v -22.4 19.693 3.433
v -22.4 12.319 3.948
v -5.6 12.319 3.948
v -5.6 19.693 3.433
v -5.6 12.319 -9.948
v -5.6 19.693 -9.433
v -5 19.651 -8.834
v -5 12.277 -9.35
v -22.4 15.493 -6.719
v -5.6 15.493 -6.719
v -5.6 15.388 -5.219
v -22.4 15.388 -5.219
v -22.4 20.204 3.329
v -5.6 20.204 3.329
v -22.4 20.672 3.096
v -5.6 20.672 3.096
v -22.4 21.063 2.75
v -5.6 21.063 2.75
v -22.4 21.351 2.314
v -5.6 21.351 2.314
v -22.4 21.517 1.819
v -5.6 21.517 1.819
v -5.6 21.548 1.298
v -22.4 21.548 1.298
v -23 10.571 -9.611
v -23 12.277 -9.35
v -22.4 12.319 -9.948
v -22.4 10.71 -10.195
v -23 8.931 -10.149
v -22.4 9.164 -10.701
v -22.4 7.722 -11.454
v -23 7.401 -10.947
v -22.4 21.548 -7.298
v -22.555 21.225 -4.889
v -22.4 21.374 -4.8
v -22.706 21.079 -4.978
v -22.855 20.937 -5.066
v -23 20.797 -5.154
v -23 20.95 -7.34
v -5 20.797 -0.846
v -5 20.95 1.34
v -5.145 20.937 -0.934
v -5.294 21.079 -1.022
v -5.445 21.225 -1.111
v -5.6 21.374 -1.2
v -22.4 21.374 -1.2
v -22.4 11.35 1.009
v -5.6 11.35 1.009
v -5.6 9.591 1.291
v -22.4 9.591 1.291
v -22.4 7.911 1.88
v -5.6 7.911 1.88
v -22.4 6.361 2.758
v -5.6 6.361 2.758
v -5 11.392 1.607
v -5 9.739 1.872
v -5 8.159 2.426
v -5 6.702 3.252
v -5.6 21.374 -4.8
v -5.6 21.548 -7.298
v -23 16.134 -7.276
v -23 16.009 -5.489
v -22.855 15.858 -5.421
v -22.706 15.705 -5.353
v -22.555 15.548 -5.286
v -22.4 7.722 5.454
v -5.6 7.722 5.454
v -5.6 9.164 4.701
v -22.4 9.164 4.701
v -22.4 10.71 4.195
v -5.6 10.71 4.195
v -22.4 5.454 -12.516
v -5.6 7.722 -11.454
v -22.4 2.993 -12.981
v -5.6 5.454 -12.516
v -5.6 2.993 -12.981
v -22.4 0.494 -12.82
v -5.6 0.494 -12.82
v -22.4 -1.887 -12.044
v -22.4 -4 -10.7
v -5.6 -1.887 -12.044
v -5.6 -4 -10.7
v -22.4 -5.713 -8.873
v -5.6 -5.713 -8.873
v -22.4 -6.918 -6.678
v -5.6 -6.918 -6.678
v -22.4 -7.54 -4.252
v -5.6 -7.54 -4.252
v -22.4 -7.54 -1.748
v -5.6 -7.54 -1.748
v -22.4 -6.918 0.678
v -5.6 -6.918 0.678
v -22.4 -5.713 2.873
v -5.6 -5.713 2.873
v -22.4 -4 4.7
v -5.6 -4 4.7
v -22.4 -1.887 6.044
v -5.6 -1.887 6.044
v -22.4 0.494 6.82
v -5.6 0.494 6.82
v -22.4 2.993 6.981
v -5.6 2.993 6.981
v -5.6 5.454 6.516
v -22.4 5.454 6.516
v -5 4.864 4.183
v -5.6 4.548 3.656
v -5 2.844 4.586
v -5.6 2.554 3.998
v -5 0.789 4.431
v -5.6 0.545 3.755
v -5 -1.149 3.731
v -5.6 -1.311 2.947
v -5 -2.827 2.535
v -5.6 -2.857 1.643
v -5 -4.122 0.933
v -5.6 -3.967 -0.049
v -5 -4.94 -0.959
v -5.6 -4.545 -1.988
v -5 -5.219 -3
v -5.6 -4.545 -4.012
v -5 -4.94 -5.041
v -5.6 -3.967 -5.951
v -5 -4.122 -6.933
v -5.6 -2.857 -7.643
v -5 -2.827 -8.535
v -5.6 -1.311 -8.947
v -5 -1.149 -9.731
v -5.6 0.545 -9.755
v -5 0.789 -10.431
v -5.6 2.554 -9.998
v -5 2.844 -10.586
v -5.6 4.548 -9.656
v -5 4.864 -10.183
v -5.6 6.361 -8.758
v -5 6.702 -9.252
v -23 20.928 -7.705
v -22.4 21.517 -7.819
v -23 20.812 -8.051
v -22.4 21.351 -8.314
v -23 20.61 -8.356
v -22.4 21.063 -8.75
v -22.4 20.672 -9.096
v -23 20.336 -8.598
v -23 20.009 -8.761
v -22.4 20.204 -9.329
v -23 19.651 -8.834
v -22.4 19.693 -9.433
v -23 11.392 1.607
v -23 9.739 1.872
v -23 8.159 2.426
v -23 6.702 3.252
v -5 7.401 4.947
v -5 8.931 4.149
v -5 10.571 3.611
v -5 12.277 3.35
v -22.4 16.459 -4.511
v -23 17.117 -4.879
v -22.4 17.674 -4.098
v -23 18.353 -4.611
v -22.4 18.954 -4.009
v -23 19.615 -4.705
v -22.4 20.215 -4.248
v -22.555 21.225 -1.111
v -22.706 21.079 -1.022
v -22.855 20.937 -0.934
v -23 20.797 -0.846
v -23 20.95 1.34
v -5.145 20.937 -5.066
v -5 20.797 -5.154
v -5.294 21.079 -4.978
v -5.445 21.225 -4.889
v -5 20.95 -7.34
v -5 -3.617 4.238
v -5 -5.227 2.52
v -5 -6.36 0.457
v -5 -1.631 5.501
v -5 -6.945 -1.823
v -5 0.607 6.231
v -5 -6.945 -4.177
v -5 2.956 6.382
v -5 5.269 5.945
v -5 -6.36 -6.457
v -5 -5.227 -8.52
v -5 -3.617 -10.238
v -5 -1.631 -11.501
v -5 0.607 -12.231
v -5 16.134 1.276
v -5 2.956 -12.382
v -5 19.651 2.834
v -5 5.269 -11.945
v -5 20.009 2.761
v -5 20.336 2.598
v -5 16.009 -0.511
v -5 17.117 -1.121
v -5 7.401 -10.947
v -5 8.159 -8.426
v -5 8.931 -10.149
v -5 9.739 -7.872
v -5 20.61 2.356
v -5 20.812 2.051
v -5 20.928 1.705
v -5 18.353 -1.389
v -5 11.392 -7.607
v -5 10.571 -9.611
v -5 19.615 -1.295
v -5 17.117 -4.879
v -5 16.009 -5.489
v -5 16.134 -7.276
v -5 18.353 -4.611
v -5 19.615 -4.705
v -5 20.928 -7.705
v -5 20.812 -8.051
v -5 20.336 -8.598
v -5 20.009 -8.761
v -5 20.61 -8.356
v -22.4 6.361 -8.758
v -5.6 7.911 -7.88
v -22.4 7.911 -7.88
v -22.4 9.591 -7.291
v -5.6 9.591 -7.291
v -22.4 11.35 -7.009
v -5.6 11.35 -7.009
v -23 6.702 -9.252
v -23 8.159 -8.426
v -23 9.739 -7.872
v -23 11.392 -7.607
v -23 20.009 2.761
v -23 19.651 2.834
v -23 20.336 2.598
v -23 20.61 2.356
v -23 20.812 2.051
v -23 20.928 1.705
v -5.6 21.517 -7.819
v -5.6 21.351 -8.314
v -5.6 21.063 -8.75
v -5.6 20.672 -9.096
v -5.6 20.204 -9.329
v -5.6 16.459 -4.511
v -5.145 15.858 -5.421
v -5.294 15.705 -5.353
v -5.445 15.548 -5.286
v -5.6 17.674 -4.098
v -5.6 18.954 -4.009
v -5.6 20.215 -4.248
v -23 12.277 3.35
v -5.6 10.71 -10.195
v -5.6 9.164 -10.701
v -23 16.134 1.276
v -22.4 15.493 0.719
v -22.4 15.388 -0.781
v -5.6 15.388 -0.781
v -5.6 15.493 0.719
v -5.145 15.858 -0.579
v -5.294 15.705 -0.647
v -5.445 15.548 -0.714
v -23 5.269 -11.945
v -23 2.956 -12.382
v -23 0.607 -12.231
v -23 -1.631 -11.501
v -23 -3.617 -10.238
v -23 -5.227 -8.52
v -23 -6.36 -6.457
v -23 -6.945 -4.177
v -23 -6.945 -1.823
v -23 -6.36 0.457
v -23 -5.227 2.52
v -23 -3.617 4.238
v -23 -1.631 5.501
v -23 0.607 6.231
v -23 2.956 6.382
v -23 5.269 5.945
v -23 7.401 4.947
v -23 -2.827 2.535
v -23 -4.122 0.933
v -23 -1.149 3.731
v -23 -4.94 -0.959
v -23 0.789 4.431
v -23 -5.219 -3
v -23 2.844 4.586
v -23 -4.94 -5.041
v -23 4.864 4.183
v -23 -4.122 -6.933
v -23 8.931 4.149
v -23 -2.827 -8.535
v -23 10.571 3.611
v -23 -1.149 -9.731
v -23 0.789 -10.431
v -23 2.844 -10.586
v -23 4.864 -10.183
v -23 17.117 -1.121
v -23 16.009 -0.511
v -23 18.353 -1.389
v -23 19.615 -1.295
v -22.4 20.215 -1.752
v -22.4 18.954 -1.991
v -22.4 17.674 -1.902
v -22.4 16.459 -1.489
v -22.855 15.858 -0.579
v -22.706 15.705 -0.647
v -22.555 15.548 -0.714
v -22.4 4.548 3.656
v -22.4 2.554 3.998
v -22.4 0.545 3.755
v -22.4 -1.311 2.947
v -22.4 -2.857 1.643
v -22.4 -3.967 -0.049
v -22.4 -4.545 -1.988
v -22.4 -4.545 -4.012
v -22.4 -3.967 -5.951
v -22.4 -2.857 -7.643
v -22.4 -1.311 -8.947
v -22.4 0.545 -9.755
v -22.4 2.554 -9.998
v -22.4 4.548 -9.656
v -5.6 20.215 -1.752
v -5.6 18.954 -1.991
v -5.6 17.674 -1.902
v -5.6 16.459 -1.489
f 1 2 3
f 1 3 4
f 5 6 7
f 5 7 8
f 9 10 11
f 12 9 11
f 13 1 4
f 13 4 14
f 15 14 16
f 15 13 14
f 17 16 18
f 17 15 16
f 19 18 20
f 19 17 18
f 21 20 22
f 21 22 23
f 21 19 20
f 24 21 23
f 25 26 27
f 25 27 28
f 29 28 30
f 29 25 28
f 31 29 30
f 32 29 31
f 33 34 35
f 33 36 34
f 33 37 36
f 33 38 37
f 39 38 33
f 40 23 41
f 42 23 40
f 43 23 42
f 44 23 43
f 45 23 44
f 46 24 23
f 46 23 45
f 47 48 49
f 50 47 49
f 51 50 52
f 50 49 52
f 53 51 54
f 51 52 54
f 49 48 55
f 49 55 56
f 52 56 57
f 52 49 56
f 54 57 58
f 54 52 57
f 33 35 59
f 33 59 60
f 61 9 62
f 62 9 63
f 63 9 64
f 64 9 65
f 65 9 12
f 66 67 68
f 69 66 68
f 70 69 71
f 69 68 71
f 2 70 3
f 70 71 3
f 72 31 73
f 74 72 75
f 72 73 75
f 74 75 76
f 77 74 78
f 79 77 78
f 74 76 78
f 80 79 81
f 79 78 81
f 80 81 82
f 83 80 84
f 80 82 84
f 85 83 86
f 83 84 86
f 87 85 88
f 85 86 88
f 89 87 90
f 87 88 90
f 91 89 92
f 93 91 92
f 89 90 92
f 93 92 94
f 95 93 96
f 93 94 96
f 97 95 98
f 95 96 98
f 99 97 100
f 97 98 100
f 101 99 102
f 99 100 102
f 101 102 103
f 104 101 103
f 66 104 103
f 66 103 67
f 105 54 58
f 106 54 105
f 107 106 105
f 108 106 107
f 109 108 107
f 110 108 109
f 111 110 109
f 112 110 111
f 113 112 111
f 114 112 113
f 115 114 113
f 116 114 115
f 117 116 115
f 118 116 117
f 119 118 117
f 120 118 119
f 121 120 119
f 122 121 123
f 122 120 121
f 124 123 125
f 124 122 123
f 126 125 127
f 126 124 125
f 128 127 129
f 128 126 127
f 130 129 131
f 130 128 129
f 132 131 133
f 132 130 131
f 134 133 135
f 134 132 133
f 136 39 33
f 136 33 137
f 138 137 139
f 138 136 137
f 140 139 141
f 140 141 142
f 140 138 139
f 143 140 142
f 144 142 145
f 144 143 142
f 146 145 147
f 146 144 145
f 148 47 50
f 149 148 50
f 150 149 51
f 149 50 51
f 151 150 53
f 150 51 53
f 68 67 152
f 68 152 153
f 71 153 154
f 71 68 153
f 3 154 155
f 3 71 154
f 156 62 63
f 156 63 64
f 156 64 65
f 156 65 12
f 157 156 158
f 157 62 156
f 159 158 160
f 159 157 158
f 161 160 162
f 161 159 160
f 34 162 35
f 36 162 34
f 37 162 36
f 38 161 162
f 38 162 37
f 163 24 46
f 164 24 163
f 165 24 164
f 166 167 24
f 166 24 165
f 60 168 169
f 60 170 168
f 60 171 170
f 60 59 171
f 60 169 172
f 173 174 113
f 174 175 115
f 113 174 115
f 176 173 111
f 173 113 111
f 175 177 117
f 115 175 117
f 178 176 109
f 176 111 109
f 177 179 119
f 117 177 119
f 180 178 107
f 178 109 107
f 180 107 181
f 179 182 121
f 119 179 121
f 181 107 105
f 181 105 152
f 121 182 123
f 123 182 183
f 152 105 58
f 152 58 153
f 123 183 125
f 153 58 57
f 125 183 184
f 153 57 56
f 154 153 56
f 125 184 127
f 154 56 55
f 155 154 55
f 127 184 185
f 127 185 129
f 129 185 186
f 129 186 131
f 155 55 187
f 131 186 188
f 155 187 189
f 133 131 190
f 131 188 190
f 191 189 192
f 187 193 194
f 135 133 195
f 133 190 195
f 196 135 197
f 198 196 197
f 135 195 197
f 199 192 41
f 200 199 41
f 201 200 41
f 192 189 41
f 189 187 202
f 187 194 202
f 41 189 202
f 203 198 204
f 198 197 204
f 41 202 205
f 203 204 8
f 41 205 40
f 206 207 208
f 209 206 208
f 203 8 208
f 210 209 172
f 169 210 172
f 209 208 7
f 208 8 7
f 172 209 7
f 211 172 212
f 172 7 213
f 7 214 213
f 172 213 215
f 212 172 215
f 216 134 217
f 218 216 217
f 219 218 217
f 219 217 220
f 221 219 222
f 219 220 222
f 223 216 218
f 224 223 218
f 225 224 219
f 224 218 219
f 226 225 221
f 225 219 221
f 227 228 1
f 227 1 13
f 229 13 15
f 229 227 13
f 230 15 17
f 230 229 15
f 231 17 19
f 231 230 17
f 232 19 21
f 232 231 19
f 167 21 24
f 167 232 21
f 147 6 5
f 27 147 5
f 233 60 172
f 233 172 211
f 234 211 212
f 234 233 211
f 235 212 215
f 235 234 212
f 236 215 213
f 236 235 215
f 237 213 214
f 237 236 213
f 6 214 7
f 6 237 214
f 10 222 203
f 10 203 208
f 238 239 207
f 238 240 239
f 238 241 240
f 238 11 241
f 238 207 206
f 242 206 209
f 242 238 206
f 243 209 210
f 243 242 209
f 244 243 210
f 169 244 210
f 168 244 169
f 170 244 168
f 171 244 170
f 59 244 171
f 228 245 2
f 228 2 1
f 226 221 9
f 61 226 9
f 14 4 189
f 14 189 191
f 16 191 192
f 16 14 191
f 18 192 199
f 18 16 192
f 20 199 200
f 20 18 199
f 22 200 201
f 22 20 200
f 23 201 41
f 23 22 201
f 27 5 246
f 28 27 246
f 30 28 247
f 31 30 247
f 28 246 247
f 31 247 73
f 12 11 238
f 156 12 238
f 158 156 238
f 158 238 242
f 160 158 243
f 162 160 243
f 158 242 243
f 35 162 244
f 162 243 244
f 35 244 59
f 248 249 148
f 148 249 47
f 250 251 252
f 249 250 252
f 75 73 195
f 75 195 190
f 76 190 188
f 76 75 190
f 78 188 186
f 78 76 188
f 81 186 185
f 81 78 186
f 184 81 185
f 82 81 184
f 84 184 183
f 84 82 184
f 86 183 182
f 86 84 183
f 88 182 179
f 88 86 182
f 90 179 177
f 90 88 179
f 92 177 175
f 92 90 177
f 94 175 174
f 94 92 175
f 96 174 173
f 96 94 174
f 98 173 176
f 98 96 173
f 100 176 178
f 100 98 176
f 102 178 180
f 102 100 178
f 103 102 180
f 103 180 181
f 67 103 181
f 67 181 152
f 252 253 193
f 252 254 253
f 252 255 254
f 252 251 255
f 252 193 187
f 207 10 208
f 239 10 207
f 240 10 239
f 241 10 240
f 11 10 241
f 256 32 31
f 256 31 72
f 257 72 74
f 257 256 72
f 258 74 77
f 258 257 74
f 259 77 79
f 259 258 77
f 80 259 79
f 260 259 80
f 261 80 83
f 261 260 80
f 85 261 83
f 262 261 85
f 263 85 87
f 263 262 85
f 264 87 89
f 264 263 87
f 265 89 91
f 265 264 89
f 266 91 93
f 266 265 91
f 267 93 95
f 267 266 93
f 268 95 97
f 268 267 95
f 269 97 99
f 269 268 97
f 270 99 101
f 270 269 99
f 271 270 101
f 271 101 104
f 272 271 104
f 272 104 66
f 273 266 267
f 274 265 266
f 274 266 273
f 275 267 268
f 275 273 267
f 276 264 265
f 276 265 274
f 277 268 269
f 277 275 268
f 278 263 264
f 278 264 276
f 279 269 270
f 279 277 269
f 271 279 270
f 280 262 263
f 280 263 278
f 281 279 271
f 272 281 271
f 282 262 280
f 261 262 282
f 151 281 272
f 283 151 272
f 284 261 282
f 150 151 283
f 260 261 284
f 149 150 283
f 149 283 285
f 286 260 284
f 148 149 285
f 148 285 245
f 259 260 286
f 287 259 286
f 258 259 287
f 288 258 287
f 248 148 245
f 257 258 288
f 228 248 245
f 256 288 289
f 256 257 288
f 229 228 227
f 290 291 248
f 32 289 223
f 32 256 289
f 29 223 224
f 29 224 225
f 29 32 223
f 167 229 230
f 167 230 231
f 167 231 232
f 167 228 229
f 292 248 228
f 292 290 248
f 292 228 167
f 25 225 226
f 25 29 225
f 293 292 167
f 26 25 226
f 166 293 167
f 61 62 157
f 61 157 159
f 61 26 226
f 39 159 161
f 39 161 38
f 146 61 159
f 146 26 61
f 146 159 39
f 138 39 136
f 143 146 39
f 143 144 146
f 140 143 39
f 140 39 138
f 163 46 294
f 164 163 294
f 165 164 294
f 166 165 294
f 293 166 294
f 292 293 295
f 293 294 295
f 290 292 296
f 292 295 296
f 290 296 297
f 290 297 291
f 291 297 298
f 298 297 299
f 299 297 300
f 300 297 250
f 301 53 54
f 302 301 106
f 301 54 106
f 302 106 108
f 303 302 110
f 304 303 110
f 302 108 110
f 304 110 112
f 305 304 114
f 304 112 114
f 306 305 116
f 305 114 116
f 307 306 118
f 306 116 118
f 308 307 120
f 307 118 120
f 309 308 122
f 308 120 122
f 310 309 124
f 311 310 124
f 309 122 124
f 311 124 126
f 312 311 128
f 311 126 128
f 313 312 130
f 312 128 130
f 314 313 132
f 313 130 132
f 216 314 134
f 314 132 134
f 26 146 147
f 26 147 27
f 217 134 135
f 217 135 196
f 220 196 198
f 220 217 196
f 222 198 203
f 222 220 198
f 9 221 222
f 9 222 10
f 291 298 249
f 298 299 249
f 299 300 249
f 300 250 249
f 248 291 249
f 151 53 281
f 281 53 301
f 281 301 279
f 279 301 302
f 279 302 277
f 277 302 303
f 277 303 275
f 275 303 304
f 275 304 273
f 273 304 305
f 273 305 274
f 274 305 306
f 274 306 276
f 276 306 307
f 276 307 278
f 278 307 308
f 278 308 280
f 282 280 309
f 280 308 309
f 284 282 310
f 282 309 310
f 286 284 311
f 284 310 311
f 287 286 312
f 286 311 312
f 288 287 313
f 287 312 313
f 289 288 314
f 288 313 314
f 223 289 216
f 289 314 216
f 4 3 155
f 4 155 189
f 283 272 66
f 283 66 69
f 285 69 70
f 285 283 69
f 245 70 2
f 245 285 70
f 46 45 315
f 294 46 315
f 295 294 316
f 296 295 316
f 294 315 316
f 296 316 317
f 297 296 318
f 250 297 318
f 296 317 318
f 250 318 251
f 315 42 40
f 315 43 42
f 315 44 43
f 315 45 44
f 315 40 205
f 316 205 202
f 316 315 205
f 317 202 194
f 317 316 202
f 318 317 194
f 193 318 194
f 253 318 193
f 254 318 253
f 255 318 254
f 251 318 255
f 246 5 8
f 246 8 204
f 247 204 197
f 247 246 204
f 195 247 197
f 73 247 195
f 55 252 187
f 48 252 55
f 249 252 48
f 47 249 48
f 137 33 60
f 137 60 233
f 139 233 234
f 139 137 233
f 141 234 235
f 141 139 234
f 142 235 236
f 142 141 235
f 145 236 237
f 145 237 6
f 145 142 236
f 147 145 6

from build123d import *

# Parameters (mm, degrees)
BOSS_EXTRUDE1_DEPTH = 18
FILLET1_R           = 2
CHAMFER1_SIZE       = 0.6


with BuildPart() as part:
    # Sketch2 → Boss-Extrude1 (new body)
    with BuildSketch(Plane(origin=(-5, 5, -3), x_dir=(0, 1, 0), z_dir=(-1, 0, 0))):
        with BuildLine():
            Line((16.373766646, 1.800474378), (16.687926286, 6.293166529))
            Line((16.687926286, 6.293166529), (7.318960954, 6.948308405))
            ThreePointArc((7.318960954, 6.948308405), (4.926891937, 7.41631163), (2.721626751, 8.45449594))
            ThreePointArc((2.721626751, 8.45449594), (-12.618925504, 0), (2.721626751, -8.45449594))
            ThreePointArc((2.721626751, -8.45449594), (4.926891937, -7.41631163), (7.318960954, -6.948308405))
            Line((7.318960954, -6.948308405), (16.687926286, -6.293166529))
            Line((16.687926286, -6.293166529), (16.373766646, -1.800474378))
            ThreePointArc((16.373766646, -1.800474378), (13.311318022, -1.012179749), (10.388382345, -2.21901322))
            Line((10.388382345, -2.21901322), (10.493272563, -3.71901322))
            Line((10.493272563, -3.71901322), (6.349775255, -4.008754777))
            ThreePointArc((6.349775255, -4.008754777), (3.737837364, -4.547913289), (1.361301465, -5.758280409))
            ThreePointArc((1.361301465, -5.758280409), (-9.618925504, 0), (1.361301465, 5.758280409))
            ThreePointArc((1.361301465, 5.758280409), (3.737837364, 4.547913289), (6.349775255, 4.008754777))
            Line((6.349775255, 4.008754777), (10.493272563, 3.71901322))
            Line((10.493272563, 3.71901322), (10.388382345, 2.21901322))
            ThreePointArc((10.388382345, 2.21901322), (13.311318022, 1.012179749), (16.373766646, 1.800474378))
        make_face()
    extrude(amount=BOSS_EXTRUDE1_DEPTH)

    # Fillet1
    fillet1_edges = [part.edges().sort_by_distance(p)[0] for p in [
        (-14, 21.687926286, 3.293166529),
        (-14, 21.687926286, -9.293166529),
    ]]
    fillet(fillet1_edges, radius=FILLET1_R)

    # Chamfer1
    chamfer1_edges = [part.edges().sort_by_distance(p)[0] for p in [
        (-23, -4.618925504, -3),
        (-23, 8.737837364, -7.547913289),
        (-5, 13.421523909, 0.863883999),
        (-5, 15.440827454, -0.03098678),
        (-5, 18.311318022, -1.987820251),
        (-5, 21.461089992, 0.049256403),
        (-5, 9.926891937, 4.41631163),
        (-5, -7.618925504, -3),
        (-23, 13.421523909, -6.863883999),
        (-5, 9.926891937, -10.41631163),
        (-5, 21.461089992, -6.049256403),
        (-5, 18.311318022, -4.012179749),
        (-5, 15.440827454, -5.96901322),
        (-5, 13.421523909, -6.863883999),
        (-5, 8.737837364, -7.547913289),
        (-5, -4.618925504, -3),
        (-5, 8.737837364, 1.547913289),
        (-23, 15.440827454, -5.96901322),
        (-23, 18.311318022, -4.012179749),
        (-23, 21.461089992, -6.049256403),
        (-23, 9.926891937, -10.41631163),
        (-5, 16.00587957, 3.690493941),
        (-5, 16.00587957, -9.690493941),
        (-5, 21.062704398, -8.749669433),
        (-23, -7.618925504, -3),
        (-5, 21.062704398, 2.749669433),
        (-23, 16.00587957, 3.690493941),
        (-23, 16.00587957, -9.690493941),
        (-23, 21.062704398, -8.749669433),
        (-23, 21.062704398, 2.749669433),
        (-23, 9.926891937, 4.41631163),
        (-23, 8.737837364, 1.547913289),
        (-23, 21.461089992, 0.049256403),
        (-23, 18.311318022, -1.987820251),
        (-23, 15.440827454, -0.03098678),
        (-23, 13.421523909, 0.863883999),
    ]]
    chamfer(chamfer1_edges, length=CHAMFER1_SIZE)


solid = part.part
